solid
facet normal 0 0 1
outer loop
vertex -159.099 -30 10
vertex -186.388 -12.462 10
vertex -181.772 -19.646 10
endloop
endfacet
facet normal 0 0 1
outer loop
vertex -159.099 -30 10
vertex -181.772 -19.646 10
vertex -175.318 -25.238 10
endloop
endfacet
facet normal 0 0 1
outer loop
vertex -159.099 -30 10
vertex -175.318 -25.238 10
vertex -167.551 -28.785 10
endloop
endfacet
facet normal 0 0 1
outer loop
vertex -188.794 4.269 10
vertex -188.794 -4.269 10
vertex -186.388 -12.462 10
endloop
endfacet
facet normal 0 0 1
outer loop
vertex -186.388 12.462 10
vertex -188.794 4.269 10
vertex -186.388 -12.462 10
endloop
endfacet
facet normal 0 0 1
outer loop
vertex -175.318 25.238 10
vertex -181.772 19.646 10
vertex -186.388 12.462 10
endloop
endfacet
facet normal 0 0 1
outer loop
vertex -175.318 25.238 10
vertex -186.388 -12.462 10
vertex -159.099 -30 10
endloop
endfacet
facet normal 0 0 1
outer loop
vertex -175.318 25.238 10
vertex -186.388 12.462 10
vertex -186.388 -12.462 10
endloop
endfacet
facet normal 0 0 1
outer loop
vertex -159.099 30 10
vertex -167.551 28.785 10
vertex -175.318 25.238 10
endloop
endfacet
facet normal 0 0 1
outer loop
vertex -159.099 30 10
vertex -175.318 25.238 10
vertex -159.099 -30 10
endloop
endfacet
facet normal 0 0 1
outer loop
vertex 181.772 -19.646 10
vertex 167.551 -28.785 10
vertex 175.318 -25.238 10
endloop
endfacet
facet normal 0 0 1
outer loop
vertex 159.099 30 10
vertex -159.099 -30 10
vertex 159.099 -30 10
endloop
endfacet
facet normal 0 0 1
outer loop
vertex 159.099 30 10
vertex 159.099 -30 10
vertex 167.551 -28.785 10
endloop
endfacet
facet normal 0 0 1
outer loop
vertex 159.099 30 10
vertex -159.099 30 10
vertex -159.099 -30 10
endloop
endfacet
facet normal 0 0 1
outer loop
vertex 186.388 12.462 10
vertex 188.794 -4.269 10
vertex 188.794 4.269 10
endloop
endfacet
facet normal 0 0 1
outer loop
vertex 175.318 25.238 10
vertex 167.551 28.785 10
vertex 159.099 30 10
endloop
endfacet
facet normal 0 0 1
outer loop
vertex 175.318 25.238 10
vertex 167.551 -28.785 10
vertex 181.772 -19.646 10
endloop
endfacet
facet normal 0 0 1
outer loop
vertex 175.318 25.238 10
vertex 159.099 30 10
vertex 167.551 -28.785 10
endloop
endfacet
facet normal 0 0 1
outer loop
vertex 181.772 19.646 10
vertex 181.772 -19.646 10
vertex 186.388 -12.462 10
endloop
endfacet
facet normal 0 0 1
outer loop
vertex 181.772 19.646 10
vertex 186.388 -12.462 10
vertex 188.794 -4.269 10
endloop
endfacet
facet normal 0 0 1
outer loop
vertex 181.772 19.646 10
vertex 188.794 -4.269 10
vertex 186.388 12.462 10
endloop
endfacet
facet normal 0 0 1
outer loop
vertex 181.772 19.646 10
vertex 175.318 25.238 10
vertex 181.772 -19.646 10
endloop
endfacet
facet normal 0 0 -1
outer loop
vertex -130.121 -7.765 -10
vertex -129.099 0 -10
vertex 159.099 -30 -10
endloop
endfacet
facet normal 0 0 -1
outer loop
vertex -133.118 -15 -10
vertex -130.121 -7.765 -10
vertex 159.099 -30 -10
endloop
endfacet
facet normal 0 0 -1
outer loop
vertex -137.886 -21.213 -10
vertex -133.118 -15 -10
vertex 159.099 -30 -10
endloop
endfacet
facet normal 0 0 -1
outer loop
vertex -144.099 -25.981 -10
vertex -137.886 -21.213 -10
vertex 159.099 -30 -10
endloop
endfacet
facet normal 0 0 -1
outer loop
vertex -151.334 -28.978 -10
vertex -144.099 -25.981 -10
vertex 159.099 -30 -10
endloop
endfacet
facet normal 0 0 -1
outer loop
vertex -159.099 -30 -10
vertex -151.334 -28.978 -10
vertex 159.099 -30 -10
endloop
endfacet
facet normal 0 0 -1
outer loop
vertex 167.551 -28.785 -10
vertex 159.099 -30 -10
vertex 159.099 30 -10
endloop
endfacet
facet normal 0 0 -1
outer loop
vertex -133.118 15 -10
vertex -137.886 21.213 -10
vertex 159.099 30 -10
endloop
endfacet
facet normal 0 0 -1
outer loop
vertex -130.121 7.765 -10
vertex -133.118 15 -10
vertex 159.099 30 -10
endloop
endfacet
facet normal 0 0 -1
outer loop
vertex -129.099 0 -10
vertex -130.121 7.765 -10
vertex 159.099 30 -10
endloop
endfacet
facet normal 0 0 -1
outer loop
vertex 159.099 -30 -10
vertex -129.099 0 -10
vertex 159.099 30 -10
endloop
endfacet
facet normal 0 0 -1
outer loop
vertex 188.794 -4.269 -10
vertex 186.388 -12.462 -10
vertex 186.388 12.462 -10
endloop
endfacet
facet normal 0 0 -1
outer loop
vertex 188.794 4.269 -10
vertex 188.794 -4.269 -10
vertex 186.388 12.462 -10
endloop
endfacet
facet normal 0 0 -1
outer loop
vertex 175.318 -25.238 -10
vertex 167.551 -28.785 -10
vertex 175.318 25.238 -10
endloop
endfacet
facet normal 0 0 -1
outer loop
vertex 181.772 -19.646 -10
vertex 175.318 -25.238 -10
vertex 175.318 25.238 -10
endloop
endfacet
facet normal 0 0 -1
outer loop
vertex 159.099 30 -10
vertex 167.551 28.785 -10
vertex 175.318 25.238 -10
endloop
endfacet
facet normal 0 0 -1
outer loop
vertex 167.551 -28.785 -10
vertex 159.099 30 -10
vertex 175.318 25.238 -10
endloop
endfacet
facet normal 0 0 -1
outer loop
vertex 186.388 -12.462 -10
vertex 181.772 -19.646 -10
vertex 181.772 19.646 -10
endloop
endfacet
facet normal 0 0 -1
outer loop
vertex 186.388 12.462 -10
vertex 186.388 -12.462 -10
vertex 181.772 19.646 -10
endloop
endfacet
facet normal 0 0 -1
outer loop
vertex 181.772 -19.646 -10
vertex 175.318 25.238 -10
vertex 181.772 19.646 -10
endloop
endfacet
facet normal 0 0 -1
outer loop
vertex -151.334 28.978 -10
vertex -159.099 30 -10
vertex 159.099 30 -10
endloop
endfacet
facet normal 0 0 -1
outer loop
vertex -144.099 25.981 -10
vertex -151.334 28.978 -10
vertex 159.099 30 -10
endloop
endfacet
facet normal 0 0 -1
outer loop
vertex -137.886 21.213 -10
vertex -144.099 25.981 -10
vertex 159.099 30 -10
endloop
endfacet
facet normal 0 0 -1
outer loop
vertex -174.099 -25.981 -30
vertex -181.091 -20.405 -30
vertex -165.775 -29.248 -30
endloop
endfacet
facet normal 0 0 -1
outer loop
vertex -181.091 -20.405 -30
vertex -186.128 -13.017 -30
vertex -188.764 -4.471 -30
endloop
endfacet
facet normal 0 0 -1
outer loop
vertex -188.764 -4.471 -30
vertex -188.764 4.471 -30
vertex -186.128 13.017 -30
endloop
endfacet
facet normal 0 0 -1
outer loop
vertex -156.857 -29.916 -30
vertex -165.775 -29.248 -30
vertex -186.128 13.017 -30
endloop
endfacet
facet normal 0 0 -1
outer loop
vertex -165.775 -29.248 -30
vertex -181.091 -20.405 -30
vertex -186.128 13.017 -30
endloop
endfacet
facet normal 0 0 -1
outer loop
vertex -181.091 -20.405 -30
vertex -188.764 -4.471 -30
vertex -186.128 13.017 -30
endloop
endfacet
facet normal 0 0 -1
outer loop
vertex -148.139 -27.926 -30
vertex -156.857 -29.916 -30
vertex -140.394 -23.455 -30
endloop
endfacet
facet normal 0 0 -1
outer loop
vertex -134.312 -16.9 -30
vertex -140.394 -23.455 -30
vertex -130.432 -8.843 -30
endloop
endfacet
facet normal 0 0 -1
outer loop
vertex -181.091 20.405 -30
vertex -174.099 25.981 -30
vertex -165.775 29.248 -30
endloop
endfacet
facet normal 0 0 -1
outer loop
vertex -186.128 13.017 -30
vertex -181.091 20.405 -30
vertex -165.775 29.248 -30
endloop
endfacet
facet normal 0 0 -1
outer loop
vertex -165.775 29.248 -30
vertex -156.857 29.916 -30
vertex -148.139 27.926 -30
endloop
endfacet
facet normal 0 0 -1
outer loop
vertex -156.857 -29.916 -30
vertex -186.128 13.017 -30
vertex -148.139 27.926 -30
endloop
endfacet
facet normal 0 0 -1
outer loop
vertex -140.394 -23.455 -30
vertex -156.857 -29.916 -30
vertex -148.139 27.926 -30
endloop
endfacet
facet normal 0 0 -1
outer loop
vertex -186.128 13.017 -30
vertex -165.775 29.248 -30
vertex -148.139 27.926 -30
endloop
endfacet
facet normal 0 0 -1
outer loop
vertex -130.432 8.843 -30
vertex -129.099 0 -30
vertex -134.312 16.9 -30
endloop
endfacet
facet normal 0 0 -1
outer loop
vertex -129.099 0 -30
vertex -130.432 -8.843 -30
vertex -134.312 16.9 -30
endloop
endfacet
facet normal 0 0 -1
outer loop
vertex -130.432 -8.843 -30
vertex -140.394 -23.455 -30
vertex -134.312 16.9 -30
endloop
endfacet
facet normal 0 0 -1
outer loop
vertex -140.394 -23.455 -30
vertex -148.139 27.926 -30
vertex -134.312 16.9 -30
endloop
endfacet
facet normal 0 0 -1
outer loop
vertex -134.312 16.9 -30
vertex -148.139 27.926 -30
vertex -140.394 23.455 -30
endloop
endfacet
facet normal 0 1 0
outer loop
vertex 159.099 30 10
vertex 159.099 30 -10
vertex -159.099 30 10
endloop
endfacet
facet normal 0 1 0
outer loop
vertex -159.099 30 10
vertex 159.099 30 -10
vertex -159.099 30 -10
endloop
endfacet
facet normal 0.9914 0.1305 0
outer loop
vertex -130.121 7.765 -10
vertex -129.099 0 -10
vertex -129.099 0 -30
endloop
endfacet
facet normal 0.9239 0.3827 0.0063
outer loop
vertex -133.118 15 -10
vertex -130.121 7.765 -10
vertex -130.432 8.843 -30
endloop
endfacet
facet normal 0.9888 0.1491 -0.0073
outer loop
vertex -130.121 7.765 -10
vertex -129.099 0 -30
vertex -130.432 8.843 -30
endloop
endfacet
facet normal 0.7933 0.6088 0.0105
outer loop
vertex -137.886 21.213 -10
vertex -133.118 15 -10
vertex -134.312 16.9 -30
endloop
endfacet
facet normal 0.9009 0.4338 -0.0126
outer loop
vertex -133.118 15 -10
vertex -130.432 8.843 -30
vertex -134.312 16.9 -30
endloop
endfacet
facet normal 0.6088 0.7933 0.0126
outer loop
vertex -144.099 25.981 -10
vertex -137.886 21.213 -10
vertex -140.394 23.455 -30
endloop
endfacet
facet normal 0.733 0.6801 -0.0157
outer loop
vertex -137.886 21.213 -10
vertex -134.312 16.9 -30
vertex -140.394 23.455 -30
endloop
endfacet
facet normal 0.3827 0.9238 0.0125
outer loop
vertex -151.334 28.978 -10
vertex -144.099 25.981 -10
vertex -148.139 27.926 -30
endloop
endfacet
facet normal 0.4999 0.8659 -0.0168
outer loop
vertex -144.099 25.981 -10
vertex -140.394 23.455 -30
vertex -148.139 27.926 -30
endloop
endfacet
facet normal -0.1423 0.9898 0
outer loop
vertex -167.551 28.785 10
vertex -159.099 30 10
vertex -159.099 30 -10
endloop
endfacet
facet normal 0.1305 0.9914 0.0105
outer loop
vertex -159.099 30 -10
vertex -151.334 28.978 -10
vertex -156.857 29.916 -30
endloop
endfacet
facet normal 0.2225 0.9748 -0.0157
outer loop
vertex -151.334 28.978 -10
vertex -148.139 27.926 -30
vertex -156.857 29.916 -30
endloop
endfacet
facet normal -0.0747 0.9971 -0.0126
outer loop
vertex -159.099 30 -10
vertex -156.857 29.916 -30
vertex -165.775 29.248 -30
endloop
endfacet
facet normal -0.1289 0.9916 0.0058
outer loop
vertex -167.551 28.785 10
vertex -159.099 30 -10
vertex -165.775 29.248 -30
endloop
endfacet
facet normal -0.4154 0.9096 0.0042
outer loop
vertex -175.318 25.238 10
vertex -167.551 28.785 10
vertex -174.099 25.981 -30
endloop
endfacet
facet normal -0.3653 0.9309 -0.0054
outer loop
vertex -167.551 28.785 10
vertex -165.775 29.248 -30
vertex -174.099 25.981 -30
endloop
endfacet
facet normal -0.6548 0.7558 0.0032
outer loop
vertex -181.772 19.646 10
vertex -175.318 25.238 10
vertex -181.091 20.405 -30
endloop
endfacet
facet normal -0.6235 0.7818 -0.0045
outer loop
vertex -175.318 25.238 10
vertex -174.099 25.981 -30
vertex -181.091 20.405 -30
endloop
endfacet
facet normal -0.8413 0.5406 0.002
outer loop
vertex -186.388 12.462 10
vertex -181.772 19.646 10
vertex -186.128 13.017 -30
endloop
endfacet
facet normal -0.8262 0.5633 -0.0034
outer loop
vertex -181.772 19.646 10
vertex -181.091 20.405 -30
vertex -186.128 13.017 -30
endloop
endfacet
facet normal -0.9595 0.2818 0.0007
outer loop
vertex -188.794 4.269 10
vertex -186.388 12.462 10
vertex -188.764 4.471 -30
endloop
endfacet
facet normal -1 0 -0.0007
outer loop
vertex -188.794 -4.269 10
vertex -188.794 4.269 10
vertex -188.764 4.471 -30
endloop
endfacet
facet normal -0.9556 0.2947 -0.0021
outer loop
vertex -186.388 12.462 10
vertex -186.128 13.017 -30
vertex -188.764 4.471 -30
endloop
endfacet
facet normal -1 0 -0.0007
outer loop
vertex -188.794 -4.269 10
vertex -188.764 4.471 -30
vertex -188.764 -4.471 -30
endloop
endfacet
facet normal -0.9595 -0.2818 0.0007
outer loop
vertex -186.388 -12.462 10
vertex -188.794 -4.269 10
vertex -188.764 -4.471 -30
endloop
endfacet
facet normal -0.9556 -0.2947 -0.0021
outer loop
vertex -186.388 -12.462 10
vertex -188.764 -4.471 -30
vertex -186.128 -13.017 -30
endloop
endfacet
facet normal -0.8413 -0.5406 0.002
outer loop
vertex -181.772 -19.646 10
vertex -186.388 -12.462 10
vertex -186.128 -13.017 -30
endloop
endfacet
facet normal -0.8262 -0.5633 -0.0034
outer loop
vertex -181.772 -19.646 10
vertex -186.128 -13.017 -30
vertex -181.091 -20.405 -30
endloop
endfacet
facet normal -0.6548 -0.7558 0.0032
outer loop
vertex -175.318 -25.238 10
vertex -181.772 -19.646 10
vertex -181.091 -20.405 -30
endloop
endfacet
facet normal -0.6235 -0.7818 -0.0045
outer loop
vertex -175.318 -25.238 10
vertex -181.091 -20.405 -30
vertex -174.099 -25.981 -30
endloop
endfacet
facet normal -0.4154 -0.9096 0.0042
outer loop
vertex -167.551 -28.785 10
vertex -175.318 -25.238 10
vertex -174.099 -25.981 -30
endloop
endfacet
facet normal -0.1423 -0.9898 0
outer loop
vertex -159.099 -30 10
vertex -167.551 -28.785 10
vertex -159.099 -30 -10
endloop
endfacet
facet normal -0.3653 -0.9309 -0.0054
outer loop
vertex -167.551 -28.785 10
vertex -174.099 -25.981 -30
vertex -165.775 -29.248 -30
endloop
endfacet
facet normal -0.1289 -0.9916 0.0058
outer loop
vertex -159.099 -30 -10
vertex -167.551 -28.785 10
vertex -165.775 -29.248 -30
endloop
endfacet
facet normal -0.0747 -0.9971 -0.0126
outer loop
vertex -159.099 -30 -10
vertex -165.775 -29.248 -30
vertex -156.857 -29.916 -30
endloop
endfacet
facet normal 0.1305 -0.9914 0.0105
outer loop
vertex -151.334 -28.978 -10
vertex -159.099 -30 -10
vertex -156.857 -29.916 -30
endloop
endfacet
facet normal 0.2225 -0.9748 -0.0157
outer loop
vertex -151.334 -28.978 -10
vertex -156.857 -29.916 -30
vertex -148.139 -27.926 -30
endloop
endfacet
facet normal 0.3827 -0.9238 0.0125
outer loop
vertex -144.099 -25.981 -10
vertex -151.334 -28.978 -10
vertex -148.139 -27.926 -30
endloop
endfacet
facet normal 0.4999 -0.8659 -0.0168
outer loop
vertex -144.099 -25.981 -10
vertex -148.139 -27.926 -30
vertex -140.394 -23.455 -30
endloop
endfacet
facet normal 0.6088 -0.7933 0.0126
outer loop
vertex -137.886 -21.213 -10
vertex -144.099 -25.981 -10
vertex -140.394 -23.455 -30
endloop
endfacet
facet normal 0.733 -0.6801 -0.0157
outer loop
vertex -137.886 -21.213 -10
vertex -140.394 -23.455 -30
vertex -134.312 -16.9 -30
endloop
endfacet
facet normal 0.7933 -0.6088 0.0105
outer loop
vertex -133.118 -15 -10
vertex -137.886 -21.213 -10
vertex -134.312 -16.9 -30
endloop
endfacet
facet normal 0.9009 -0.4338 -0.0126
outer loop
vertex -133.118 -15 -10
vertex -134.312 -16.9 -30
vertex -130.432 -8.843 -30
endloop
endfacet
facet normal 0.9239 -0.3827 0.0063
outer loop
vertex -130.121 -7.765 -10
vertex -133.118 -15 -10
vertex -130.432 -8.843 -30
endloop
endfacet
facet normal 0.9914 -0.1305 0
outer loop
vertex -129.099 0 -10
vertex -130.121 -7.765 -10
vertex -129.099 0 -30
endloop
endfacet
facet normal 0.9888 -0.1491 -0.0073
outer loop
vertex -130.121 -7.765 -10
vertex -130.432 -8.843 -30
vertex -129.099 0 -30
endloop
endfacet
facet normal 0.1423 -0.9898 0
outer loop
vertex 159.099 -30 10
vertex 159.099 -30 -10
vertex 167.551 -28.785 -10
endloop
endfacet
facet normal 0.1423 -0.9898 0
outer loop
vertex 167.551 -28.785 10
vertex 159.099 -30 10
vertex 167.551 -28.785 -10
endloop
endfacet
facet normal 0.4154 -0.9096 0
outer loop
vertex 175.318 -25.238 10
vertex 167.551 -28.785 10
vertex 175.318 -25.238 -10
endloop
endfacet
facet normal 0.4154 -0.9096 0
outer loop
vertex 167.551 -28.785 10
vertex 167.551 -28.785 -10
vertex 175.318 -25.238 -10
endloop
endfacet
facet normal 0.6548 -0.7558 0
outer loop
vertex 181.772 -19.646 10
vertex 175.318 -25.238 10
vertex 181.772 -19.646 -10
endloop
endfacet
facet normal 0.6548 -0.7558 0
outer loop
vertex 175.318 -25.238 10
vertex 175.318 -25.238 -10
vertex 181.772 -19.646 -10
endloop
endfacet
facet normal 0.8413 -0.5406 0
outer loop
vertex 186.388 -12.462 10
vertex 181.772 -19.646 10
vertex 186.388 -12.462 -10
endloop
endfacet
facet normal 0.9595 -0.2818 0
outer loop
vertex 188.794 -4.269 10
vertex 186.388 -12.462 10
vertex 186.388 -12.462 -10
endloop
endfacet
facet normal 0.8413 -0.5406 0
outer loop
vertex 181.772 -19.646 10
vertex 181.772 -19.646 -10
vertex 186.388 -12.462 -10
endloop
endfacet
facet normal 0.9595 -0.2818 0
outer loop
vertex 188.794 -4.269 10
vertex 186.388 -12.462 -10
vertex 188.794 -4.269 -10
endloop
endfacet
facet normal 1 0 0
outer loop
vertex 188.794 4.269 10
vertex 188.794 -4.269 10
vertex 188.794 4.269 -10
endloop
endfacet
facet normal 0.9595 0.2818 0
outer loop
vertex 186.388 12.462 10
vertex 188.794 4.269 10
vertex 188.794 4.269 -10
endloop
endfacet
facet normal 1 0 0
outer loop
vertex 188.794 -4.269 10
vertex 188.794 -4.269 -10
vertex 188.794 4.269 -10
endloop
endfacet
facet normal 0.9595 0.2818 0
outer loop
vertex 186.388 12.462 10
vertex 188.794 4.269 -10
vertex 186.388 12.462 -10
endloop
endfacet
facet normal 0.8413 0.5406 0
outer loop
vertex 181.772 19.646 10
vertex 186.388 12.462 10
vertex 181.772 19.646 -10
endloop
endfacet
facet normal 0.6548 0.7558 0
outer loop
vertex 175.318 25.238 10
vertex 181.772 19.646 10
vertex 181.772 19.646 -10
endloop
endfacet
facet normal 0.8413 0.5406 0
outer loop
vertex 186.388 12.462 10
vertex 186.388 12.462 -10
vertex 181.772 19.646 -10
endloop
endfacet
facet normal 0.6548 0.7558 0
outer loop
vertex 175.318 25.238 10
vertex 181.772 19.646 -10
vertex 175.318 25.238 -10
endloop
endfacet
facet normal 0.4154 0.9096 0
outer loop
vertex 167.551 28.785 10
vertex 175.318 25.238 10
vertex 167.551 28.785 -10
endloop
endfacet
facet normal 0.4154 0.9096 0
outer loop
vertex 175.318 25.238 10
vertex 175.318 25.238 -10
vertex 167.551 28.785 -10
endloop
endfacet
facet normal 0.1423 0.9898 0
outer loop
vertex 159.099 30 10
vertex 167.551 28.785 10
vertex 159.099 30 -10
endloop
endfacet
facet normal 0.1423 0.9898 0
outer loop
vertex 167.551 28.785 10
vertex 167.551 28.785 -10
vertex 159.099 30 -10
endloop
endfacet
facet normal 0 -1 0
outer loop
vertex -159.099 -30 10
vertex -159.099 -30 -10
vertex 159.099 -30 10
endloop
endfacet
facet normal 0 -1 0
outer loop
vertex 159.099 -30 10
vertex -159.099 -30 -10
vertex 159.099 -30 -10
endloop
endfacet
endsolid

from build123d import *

# Parameters (mm, degrees)
EXTRUDE_1_DEPTH      = 10
EXTRUDE_1_DEPTH_BACK = 10
EXTRUDE_START        = -30
SKETCH_2_R           = 30
EXTRUDE_2_DEPTH      = 30


with BuildPart() as part:
    # 草图1 → 凸台-拉伸1 (new, two sides: drawn at the far end of the back side and taken through both)
    with BuildSketch(Plane.XY.offset(-EXTRUDE_1_DEPTH_BACK)):
        with BuildLine():
            Line((159.099025767, 30), (-159.099025767, 30))
            ThreePointArc((-159.099025767, 30), (-189.099025767, 0), (-159.099025767, -30))
            Line((-159.099025767, -30), (159.099025767, -30))
            ThreePointArc((159.099025767, -30), (189.099025767, 0), (159.099025767, 30))
        make_face()
    extrude(amount=EXTRUDE_1_DEPTH + EXTRUDE_1_DEPTH_BACK)

    # 草图2 → 凸台-拉伸2 (add)
    with BuildSketch(Plane.XY.offset(EXTRUDE_START)):
        with Locations((-159.099025767, 0)):
            Circle(SKETCH_2_R)
    extrude(amount=EXTRUDE_2_DEPTH)


solid = part.part
